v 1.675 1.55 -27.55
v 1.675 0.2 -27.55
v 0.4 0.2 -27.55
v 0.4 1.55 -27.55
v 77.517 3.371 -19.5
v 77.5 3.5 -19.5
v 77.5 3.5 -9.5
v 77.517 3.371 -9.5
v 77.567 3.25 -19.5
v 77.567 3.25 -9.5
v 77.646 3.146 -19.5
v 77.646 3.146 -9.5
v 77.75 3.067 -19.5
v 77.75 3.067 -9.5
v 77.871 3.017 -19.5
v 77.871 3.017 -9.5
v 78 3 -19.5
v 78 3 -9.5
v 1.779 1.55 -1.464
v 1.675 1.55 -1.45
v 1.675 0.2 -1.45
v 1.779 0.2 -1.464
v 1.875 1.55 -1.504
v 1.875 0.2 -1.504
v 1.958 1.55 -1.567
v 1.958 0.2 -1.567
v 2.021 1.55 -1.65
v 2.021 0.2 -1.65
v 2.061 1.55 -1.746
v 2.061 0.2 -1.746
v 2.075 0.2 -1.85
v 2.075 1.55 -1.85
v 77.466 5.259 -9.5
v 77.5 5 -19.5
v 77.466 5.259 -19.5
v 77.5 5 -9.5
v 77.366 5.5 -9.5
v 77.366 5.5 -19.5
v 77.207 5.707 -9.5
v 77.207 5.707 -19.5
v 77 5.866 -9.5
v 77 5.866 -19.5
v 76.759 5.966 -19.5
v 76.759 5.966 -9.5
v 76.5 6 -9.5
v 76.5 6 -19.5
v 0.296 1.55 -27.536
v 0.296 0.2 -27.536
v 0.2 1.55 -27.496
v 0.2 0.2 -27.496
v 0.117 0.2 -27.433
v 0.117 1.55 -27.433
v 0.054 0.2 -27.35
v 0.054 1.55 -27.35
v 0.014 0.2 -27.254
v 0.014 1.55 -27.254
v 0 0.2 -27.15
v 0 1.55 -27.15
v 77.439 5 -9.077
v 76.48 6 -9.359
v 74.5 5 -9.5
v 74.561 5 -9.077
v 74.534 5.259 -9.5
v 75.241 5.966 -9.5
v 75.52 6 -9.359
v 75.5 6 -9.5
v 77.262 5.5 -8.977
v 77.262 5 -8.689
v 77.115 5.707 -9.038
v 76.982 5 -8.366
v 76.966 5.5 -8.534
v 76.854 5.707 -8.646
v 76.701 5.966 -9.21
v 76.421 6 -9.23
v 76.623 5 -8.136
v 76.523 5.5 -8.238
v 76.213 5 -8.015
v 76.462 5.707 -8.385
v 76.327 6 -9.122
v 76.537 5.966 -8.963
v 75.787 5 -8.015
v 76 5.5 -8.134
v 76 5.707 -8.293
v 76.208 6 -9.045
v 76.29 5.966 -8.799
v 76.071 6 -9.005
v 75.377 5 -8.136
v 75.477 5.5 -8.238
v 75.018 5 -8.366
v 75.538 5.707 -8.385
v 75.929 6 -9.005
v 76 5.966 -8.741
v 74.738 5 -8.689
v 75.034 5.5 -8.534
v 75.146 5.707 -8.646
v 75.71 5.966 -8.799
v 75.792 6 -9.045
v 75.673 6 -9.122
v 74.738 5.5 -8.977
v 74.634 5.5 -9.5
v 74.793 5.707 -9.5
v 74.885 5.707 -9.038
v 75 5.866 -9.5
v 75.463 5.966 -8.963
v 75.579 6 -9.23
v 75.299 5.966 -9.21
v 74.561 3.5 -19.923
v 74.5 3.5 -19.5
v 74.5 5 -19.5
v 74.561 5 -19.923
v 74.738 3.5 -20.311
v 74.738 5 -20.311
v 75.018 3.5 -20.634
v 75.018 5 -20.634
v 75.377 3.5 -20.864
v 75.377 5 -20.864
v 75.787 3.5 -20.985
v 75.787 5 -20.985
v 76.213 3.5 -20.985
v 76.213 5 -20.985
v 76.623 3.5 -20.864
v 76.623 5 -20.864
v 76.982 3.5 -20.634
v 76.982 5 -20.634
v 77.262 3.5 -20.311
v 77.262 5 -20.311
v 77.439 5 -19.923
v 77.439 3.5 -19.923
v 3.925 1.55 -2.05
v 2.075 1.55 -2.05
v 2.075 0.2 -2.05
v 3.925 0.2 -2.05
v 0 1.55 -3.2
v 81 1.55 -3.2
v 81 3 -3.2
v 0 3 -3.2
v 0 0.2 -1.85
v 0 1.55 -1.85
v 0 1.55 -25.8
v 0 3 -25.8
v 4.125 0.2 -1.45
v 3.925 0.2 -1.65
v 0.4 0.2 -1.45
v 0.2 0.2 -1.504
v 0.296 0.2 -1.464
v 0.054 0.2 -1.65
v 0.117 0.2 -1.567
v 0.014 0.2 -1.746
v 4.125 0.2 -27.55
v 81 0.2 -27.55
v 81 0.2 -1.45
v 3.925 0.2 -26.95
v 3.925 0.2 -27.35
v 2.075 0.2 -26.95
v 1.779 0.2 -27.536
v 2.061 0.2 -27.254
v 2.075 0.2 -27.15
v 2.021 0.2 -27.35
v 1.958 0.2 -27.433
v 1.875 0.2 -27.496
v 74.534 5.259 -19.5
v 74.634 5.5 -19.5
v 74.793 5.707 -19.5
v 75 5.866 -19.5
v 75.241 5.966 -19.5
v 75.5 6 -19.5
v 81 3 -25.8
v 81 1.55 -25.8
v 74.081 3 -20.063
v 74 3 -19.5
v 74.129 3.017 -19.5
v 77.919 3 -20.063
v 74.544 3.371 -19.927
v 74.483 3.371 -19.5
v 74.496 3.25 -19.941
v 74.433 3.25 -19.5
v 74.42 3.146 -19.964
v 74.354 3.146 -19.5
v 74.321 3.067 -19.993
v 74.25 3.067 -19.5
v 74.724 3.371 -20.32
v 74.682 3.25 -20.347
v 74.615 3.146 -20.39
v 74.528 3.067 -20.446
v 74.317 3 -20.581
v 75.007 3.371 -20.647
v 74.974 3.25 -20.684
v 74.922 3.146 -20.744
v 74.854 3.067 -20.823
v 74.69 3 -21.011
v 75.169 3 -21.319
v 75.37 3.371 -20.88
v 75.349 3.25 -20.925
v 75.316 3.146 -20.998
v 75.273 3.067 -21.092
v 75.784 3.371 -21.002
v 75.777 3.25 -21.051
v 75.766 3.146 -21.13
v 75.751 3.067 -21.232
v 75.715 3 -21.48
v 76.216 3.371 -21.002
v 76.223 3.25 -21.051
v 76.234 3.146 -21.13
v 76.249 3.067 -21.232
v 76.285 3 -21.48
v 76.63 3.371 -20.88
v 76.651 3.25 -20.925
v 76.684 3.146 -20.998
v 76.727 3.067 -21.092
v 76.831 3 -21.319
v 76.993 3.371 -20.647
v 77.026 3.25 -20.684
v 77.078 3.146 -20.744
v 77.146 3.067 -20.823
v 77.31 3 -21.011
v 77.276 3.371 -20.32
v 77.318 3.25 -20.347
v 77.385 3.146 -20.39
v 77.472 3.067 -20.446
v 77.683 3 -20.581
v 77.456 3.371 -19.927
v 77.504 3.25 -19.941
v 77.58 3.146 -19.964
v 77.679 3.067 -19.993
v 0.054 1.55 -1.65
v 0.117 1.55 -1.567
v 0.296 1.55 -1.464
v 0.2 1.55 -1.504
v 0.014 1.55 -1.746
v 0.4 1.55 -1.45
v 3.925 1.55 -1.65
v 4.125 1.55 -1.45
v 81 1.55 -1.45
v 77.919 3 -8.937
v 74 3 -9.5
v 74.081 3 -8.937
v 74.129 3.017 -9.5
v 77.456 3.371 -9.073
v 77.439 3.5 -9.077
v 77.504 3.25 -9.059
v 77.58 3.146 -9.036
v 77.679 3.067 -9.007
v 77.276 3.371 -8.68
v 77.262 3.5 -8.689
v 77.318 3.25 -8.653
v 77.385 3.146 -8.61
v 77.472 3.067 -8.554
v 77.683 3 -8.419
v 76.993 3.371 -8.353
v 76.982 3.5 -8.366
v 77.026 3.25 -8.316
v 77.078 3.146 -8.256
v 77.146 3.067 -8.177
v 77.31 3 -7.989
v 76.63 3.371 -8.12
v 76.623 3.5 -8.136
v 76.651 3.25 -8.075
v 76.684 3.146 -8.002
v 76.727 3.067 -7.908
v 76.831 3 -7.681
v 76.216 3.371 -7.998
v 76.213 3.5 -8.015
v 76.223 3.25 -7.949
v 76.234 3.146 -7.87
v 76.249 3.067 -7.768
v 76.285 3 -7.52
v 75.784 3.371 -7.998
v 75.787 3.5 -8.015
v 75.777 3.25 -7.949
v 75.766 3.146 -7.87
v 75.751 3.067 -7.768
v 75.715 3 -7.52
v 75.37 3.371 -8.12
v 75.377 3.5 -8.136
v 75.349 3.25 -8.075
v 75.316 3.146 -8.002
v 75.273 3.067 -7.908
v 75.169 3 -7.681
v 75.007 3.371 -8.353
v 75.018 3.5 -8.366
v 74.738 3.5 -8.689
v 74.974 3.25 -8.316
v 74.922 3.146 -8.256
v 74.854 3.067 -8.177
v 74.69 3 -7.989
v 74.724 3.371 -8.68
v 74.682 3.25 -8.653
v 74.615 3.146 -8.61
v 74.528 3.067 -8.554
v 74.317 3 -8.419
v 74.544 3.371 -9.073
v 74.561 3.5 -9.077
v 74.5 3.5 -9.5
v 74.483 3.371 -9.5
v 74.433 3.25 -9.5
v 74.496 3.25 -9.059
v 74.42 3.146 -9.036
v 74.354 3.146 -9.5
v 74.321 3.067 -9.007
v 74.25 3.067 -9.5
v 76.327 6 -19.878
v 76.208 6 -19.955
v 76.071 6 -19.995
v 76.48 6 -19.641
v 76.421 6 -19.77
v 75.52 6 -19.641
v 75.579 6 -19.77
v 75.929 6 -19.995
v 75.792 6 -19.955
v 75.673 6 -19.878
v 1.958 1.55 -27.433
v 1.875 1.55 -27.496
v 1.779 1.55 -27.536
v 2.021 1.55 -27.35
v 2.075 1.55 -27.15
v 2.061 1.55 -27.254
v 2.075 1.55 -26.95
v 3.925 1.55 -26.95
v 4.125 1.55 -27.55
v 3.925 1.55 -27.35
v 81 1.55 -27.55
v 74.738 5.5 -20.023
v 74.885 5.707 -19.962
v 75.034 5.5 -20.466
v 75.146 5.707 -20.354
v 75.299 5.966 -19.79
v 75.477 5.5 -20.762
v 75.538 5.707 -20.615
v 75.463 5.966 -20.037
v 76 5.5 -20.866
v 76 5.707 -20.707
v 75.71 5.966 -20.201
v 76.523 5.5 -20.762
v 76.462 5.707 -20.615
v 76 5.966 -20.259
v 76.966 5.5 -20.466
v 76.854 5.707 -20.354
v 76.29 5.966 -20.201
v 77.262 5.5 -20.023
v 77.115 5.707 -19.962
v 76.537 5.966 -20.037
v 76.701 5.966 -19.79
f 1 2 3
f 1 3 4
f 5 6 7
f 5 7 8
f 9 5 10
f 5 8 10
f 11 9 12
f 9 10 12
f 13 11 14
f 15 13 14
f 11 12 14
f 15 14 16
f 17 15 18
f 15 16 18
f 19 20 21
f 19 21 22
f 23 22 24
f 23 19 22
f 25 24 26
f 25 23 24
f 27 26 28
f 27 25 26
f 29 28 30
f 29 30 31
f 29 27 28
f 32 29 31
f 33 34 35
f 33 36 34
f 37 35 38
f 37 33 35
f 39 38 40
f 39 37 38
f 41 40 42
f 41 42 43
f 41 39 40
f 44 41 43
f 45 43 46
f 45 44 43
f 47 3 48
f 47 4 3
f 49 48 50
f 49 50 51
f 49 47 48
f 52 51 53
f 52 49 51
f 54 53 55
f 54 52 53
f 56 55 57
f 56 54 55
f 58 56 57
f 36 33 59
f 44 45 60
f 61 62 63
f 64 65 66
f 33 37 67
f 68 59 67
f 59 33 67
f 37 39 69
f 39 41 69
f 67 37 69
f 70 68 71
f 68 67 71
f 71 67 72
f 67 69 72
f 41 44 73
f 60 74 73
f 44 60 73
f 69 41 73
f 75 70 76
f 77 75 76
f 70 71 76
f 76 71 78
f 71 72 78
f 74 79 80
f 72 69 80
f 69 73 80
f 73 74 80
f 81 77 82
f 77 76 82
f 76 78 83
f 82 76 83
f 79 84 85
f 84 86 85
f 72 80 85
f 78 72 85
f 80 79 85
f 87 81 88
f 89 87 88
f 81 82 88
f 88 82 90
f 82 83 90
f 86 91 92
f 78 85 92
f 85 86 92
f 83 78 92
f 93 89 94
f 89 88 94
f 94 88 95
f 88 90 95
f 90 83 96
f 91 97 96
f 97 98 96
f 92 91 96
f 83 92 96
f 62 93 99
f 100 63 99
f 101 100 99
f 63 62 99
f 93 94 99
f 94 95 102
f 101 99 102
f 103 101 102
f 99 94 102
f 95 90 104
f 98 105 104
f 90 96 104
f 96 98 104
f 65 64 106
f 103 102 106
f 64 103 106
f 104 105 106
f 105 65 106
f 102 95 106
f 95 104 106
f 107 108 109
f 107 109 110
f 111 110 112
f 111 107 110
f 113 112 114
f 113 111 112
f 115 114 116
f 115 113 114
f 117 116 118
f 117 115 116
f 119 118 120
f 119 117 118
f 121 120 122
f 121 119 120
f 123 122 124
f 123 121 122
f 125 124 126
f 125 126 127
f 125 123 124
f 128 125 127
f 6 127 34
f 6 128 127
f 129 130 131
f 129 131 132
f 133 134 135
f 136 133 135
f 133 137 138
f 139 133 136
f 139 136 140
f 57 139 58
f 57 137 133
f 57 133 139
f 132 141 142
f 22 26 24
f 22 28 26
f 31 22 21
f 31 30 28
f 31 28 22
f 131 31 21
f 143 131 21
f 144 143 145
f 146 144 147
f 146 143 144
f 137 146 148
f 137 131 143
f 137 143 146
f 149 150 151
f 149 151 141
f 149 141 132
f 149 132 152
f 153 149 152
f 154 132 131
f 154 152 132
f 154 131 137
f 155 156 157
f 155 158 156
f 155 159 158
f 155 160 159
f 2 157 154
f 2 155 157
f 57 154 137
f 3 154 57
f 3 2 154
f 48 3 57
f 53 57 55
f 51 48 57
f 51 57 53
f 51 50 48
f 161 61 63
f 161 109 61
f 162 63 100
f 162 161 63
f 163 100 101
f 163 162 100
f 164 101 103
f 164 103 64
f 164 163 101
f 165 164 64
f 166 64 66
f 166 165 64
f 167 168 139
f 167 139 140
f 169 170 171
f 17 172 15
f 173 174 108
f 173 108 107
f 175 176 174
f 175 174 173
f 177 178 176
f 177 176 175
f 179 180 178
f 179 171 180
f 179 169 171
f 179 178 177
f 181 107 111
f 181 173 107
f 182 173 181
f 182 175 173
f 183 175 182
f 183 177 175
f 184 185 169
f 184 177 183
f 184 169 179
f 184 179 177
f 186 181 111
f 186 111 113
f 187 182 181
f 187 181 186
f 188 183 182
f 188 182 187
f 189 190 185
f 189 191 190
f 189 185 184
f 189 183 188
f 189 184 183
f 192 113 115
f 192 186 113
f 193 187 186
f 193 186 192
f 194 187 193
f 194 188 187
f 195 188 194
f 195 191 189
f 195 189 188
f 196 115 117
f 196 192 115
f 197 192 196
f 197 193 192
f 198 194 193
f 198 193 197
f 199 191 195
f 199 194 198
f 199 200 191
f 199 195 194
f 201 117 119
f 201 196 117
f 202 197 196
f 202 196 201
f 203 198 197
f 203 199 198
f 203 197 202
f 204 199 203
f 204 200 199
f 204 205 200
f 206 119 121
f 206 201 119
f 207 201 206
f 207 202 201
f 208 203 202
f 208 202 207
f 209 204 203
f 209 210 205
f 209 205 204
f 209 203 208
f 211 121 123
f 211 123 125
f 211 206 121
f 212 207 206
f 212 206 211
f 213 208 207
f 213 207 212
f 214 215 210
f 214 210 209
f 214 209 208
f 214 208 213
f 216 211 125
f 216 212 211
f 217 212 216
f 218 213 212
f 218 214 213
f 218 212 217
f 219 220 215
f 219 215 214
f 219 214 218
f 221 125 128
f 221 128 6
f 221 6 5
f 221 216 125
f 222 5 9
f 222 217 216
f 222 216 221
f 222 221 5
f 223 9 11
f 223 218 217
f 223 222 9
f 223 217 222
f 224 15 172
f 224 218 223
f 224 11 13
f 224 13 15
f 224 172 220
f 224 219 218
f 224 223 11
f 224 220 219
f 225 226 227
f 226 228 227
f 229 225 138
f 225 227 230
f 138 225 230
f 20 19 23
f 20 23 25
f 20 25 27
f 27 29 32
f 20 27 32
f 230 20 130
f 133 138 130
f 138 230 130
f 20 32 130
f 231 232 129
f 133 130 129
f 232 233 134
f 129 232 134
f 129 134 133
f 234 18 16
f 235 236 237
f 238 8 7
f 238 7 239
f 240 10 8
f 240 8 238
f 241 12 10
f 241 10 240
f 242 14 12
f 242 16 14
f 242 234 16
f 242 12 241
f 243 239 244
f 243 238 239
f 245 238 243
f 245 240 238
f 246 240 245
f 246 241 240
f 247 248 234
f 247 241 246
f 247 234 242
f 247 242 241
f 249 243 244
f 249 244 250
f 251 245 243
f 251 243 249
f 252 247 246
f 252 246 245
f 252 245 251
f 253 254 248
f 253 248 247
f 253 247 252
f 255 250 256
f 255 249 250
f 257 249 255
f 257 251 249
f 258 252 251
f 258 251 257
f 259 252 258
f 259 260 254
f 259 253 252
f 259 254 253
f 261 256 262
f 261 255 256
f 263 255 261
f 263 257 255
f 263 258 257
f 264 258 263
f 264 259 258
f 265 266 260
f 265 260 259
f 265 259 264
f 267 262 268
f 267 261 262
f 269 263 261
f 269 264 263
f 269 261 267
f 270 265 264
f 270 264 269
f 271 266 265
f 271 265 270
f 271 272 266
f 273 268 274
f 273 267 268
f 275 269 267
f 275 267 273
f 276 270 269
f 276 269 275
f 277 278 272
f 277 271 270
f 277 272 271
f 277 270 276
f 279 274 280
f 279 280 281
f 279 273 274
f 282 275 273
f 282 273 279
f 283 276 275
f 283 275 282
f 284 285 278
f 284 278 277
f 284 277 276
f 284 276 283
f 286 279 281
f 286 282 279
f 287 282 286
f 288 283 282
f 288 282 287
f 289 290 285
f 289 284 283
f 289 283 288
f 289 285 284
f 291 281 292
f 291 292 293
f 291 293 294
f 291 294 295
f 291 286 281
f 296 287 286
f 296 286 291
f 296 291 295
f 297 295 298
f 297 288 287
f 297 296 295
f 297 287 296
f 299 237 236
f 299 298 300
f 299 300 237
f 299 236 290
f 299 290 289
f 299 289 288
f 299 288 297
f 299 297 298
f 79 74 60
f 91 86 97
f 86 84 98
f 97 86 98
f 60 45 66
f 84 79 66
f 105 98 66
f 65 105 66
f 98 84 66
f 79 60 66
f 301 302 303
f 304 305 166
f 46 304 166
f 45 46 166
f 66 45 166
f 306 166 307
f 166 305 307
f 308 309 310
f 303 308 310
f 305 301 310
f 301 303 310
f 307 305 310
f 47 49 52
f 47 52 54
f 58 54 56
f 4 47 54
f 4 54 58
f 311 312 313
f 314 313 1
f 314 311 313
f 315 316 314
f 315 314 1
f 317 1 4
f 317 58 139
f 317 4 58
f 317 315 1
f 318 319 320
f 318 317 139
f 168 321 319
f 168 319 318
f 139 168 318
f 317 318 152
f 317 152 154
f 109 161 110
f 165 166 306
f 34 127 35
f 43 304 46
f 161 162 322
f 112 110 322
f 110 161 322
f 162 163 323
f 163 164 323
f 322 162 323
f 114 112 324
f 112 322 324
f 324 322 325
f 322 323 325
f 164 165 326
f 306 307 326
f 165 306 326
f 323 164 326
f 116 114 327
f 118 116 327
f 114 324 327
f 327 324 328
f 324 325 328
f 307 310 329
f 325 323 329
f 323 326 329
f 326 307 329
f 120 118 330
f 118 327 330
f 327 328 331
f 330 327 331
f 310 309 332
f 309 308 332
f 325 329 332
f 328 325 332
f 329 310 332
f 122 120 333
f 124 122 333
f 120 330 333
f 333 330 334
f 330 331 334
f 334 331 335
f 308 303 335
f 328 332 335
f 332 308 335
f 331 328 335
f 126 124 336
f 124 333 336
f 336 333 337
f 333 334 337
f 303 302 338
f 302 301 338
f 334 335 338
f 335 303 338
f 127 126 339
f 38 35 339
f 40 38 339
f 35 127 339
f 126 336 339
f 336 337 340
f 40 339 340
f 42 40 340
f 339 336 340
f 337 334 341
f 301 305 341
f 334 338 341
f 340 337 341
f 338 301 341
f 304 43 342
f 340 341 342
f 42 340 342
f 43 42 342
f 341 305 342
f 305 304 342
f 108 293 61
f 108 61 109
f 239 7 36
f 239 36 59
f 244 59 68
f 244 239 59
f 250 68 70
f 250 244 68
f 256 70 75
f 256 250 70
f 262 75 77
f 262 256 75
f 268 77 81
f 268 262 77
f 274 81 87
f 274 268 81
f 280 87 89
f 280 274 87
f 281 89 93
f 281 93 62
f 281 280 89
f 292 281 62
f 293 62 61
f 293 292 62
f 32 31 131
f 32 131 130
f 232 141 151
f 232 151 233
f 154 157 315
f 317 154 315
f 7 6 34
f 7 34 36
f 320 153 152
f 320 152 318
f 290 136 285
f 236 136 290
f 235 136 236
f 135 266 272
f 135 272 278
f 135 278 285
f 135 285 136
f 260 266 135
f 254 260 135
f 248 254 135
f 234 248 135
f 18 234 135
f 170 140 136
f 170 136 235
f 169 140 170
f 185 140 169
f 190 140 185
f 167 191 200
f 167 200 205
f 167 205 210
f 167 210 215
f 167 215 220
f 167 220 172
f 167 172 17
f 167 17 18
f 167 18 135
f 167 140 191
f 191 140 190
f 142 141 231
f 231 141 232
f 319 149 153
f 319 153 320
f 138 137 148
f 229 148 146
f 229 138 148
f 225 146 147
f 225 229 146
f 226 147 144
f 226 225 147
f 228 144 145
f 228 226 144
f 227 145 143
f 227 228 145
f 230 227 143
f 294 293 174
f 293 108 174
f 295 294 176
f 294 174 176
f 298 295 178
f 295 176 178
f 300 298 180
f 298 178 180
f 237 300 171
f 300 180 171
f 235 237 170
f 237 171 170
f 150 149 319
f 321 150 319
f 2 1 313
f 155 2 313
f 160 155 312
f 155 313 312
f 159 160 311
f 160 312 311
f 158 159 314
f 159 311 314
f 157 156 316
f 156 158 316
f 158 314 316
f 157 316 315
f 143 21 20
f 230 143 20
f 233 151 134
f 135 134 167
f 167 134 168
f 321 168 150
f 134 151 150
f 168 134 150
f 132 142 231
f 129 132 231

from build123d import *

# Parameters (mm, degrees)
SKETCH1_W           = 81
SKETCH1_H           = 29
BOSS_EXTRUDE1_DEPTH = 3
CUT_EXTRUDE2_DEPTH  = 81
CUT_EXTRUDE3_DEPTH  = 81
SKETCH6_W           = 1.85
SKETCH6_H           = 1.55
CUT_EXTRUDE5_DEPTH  = 0.6
FILLET6_R           = 0.4
CHAMFER2_SIZE       = 0.2
SKETCH7_W           = 1.85
SKETCH7_H           = 1.55
CUT_EXTRUDE6_DEPTH  = 0.6
FILLET7_R           = 0.4
CHAMFER3_SIZE       = 0.2
SKETCH11_W          = 81
SKETCH11_H          = 26.1
CUT_EXTRUDE7_DEPTH  = 0.2
FILLET8_R           = 0.4
BOSS_EXTRUDE2_DEPTH = 3
FILLET9_R           = 1
FILLET10_R          = 0.5


with BuildPart() as part:
    # Sketch1 → Boss-Extrude1 (new body)
    with BuildSketch(Plane(origin=(0, 0, 0), x_dir=(1, 0, 0), z_dir=(0, 1, 0))):
        with Locations((40.5, 14.5)):
            Rectangle(SKETCH1_W, SKETCH1_H)
    extrude(amount=BOSS_EXTRUDE1_DEPTH)

    # Sketch2 → Cut-Extrude2 (cut)
    with BuildSketch(Plane(origin=(81, 0, 0), x_dir=(0, 0, -1), z_dir=(1, 0, 0))):
        Polygon((0, 3), (3, 3), (3, 1.75), (1.25, 1.75), (1.25, 0), (0, 0), align=None)
        Polygon((29, 0), (27.75, 0), (27.75, 1.75), (26, 1.75), (26, 3), (29, 3), align=None)
    extrude(amount=-CUT_EXTRUDE2_DEPTH, mode=Mode.SUBTRACT)

    # Sketch4 → Cut-Extrude3 (cut)
    with BuildSketch(Plane(origin=(81, 0, 0), x_dir=(0, 0, -1), z_dir=(1, 0, 0))):
        Polygon((27.75, 0), (27.55, 0), (27.55, 1.55), (25.8, 1.55), (25.8, 3), (26, 3), (26, 1.75), (27.75, 1.75), align=None)
        Polygon((3.2, 3), (3, 3), (3, 1.75), (1.25, 1.75), (1.25, 0), (1.45, 0), (1.45, 1.55), (3.2, 1.55), align=None)
    extrude(amount=-CUT_EXTRUDE3_DEPTH, mode=Mode.SUBTRACT)

    # Sketch6 → Cut-Extrude5 (cut)
    with BuildSketch(Plane.XY.offset(-1.45)):
        with Locations((3, 0.775)):
            Rectangle(SKETCH6_W, SKETCH6_H)
    extrude(amount=-CUT_EXTRUDE5_DEPTH, mode=Mode.SUBTRACT)

    # Fillet6
    fillet6_edges = [part.edges().sort_by_distance(p)[0] for p in [
        (2.075, 0.775, -1.45),
    ]]
    fillet(fillet6_edges, radius=FILLET6_R)

    # Chamfer2
    chamfer2_edges = [part.edges().sort_by_distance(p)[0] for p in [
        (3.925, 0.775, -1.45),
    ]]
    chamfer(chamfer2_edges, length=CHAMFER2_SIZE)

    # Sketch7 → Cut-Extrude6 (cut)
    with BuildSketch(Plane(origin=(0, 0, -27.55), x_dir=(-1, 0, 0), z_dir=(0, 0, -1))):
        with Locations((-3, 0.775)):
            Rectangle(SKETCH7_W, SKETCH7_H)
    extrude(amount=-CUT_EXTRUDE6_DEPTH, mode=Mode.SUBTRACT)

    # Fillet7
    fillet7_edges = [part.edges().sort_by_distance(p)[0] for p in [
        (2.075, 0.775, -27.55),
    ]]
    fillet(fillet7_edges, radius=FILLET7_R)

    # Chamfer3
    chamfer3_edges = [part.edges().sort_by_distance(p)[0] for p in [
        (3.925, 0.775, -27.55),
    ]]
    chamfer(chamfer3_edges, length=CHAMFER3_SIZE)

    # Sketch11 → Cut-Extrude7 (cut)
    with BuildSketch(Plane(origin=(0, 0, 0), x_dir=(-1, 0, 0), z_dir=(0, -1, 0))):
        with Locations((-40.5, 14.5)):
            Rectangle(SKETCH11_W, SKETCH11_H)
    extrude(amount=-CUT_EXTRUDE7_DEPTH, mode=Mode.SUBTRACT)

    # Fillet8
    fillet8_edges = [part.edges().sort_by_distance(p)[0] for p in [
        (0, 0.875, -27.55),
        (0, 0.875, -1.45),
    ]]
    fillet(fillet8_edges, radius=FILLET8_R)

    # Sketch9 → Boss-Extrude2 (add)
    with BuildSketch(Plane(origin=(0, 3, 0), x_dir=(1, 0, 0), z_dir=(0, 1, 0))):
        with BuildLine():
            Line((74.5, 9.5), (74.5, 19.5))
            ThreePointArc((74.5, 19.5), (76, 21), (77.5, 19.5))
            Line((77.5, 19.5), (77.5, 9.5))
            ThreePointArc((77.5, 9.5), (76, 8), (74.5, 9.5))
        make_face()
    extrude(amount=BOSS_EXTRUDE2_DEPTH)

    # Fillet9
    fillet9_edges = [part.edges().sort_by_distance(p)[0] for p in [
        (76, 6, -8),
        (77.5, 6, -14.5),
        (76, 6, -21),
        (74.5, 6, -14.5),
    ]]
    fillet(fillet9_edges, radius=FILLET9_R)

    # Fillet10
    fillet10_edges = [part.edges().sort_by_distance(p)[0] for p in [
        (76, 3, -8),
        (77.5, 3, -14.5),
        (76, 3, -21),
        (74.5, 3, -14.5),
    ]]
    fillet(fillet10_edges, radius=FILLET10_R)


solid = part.part
